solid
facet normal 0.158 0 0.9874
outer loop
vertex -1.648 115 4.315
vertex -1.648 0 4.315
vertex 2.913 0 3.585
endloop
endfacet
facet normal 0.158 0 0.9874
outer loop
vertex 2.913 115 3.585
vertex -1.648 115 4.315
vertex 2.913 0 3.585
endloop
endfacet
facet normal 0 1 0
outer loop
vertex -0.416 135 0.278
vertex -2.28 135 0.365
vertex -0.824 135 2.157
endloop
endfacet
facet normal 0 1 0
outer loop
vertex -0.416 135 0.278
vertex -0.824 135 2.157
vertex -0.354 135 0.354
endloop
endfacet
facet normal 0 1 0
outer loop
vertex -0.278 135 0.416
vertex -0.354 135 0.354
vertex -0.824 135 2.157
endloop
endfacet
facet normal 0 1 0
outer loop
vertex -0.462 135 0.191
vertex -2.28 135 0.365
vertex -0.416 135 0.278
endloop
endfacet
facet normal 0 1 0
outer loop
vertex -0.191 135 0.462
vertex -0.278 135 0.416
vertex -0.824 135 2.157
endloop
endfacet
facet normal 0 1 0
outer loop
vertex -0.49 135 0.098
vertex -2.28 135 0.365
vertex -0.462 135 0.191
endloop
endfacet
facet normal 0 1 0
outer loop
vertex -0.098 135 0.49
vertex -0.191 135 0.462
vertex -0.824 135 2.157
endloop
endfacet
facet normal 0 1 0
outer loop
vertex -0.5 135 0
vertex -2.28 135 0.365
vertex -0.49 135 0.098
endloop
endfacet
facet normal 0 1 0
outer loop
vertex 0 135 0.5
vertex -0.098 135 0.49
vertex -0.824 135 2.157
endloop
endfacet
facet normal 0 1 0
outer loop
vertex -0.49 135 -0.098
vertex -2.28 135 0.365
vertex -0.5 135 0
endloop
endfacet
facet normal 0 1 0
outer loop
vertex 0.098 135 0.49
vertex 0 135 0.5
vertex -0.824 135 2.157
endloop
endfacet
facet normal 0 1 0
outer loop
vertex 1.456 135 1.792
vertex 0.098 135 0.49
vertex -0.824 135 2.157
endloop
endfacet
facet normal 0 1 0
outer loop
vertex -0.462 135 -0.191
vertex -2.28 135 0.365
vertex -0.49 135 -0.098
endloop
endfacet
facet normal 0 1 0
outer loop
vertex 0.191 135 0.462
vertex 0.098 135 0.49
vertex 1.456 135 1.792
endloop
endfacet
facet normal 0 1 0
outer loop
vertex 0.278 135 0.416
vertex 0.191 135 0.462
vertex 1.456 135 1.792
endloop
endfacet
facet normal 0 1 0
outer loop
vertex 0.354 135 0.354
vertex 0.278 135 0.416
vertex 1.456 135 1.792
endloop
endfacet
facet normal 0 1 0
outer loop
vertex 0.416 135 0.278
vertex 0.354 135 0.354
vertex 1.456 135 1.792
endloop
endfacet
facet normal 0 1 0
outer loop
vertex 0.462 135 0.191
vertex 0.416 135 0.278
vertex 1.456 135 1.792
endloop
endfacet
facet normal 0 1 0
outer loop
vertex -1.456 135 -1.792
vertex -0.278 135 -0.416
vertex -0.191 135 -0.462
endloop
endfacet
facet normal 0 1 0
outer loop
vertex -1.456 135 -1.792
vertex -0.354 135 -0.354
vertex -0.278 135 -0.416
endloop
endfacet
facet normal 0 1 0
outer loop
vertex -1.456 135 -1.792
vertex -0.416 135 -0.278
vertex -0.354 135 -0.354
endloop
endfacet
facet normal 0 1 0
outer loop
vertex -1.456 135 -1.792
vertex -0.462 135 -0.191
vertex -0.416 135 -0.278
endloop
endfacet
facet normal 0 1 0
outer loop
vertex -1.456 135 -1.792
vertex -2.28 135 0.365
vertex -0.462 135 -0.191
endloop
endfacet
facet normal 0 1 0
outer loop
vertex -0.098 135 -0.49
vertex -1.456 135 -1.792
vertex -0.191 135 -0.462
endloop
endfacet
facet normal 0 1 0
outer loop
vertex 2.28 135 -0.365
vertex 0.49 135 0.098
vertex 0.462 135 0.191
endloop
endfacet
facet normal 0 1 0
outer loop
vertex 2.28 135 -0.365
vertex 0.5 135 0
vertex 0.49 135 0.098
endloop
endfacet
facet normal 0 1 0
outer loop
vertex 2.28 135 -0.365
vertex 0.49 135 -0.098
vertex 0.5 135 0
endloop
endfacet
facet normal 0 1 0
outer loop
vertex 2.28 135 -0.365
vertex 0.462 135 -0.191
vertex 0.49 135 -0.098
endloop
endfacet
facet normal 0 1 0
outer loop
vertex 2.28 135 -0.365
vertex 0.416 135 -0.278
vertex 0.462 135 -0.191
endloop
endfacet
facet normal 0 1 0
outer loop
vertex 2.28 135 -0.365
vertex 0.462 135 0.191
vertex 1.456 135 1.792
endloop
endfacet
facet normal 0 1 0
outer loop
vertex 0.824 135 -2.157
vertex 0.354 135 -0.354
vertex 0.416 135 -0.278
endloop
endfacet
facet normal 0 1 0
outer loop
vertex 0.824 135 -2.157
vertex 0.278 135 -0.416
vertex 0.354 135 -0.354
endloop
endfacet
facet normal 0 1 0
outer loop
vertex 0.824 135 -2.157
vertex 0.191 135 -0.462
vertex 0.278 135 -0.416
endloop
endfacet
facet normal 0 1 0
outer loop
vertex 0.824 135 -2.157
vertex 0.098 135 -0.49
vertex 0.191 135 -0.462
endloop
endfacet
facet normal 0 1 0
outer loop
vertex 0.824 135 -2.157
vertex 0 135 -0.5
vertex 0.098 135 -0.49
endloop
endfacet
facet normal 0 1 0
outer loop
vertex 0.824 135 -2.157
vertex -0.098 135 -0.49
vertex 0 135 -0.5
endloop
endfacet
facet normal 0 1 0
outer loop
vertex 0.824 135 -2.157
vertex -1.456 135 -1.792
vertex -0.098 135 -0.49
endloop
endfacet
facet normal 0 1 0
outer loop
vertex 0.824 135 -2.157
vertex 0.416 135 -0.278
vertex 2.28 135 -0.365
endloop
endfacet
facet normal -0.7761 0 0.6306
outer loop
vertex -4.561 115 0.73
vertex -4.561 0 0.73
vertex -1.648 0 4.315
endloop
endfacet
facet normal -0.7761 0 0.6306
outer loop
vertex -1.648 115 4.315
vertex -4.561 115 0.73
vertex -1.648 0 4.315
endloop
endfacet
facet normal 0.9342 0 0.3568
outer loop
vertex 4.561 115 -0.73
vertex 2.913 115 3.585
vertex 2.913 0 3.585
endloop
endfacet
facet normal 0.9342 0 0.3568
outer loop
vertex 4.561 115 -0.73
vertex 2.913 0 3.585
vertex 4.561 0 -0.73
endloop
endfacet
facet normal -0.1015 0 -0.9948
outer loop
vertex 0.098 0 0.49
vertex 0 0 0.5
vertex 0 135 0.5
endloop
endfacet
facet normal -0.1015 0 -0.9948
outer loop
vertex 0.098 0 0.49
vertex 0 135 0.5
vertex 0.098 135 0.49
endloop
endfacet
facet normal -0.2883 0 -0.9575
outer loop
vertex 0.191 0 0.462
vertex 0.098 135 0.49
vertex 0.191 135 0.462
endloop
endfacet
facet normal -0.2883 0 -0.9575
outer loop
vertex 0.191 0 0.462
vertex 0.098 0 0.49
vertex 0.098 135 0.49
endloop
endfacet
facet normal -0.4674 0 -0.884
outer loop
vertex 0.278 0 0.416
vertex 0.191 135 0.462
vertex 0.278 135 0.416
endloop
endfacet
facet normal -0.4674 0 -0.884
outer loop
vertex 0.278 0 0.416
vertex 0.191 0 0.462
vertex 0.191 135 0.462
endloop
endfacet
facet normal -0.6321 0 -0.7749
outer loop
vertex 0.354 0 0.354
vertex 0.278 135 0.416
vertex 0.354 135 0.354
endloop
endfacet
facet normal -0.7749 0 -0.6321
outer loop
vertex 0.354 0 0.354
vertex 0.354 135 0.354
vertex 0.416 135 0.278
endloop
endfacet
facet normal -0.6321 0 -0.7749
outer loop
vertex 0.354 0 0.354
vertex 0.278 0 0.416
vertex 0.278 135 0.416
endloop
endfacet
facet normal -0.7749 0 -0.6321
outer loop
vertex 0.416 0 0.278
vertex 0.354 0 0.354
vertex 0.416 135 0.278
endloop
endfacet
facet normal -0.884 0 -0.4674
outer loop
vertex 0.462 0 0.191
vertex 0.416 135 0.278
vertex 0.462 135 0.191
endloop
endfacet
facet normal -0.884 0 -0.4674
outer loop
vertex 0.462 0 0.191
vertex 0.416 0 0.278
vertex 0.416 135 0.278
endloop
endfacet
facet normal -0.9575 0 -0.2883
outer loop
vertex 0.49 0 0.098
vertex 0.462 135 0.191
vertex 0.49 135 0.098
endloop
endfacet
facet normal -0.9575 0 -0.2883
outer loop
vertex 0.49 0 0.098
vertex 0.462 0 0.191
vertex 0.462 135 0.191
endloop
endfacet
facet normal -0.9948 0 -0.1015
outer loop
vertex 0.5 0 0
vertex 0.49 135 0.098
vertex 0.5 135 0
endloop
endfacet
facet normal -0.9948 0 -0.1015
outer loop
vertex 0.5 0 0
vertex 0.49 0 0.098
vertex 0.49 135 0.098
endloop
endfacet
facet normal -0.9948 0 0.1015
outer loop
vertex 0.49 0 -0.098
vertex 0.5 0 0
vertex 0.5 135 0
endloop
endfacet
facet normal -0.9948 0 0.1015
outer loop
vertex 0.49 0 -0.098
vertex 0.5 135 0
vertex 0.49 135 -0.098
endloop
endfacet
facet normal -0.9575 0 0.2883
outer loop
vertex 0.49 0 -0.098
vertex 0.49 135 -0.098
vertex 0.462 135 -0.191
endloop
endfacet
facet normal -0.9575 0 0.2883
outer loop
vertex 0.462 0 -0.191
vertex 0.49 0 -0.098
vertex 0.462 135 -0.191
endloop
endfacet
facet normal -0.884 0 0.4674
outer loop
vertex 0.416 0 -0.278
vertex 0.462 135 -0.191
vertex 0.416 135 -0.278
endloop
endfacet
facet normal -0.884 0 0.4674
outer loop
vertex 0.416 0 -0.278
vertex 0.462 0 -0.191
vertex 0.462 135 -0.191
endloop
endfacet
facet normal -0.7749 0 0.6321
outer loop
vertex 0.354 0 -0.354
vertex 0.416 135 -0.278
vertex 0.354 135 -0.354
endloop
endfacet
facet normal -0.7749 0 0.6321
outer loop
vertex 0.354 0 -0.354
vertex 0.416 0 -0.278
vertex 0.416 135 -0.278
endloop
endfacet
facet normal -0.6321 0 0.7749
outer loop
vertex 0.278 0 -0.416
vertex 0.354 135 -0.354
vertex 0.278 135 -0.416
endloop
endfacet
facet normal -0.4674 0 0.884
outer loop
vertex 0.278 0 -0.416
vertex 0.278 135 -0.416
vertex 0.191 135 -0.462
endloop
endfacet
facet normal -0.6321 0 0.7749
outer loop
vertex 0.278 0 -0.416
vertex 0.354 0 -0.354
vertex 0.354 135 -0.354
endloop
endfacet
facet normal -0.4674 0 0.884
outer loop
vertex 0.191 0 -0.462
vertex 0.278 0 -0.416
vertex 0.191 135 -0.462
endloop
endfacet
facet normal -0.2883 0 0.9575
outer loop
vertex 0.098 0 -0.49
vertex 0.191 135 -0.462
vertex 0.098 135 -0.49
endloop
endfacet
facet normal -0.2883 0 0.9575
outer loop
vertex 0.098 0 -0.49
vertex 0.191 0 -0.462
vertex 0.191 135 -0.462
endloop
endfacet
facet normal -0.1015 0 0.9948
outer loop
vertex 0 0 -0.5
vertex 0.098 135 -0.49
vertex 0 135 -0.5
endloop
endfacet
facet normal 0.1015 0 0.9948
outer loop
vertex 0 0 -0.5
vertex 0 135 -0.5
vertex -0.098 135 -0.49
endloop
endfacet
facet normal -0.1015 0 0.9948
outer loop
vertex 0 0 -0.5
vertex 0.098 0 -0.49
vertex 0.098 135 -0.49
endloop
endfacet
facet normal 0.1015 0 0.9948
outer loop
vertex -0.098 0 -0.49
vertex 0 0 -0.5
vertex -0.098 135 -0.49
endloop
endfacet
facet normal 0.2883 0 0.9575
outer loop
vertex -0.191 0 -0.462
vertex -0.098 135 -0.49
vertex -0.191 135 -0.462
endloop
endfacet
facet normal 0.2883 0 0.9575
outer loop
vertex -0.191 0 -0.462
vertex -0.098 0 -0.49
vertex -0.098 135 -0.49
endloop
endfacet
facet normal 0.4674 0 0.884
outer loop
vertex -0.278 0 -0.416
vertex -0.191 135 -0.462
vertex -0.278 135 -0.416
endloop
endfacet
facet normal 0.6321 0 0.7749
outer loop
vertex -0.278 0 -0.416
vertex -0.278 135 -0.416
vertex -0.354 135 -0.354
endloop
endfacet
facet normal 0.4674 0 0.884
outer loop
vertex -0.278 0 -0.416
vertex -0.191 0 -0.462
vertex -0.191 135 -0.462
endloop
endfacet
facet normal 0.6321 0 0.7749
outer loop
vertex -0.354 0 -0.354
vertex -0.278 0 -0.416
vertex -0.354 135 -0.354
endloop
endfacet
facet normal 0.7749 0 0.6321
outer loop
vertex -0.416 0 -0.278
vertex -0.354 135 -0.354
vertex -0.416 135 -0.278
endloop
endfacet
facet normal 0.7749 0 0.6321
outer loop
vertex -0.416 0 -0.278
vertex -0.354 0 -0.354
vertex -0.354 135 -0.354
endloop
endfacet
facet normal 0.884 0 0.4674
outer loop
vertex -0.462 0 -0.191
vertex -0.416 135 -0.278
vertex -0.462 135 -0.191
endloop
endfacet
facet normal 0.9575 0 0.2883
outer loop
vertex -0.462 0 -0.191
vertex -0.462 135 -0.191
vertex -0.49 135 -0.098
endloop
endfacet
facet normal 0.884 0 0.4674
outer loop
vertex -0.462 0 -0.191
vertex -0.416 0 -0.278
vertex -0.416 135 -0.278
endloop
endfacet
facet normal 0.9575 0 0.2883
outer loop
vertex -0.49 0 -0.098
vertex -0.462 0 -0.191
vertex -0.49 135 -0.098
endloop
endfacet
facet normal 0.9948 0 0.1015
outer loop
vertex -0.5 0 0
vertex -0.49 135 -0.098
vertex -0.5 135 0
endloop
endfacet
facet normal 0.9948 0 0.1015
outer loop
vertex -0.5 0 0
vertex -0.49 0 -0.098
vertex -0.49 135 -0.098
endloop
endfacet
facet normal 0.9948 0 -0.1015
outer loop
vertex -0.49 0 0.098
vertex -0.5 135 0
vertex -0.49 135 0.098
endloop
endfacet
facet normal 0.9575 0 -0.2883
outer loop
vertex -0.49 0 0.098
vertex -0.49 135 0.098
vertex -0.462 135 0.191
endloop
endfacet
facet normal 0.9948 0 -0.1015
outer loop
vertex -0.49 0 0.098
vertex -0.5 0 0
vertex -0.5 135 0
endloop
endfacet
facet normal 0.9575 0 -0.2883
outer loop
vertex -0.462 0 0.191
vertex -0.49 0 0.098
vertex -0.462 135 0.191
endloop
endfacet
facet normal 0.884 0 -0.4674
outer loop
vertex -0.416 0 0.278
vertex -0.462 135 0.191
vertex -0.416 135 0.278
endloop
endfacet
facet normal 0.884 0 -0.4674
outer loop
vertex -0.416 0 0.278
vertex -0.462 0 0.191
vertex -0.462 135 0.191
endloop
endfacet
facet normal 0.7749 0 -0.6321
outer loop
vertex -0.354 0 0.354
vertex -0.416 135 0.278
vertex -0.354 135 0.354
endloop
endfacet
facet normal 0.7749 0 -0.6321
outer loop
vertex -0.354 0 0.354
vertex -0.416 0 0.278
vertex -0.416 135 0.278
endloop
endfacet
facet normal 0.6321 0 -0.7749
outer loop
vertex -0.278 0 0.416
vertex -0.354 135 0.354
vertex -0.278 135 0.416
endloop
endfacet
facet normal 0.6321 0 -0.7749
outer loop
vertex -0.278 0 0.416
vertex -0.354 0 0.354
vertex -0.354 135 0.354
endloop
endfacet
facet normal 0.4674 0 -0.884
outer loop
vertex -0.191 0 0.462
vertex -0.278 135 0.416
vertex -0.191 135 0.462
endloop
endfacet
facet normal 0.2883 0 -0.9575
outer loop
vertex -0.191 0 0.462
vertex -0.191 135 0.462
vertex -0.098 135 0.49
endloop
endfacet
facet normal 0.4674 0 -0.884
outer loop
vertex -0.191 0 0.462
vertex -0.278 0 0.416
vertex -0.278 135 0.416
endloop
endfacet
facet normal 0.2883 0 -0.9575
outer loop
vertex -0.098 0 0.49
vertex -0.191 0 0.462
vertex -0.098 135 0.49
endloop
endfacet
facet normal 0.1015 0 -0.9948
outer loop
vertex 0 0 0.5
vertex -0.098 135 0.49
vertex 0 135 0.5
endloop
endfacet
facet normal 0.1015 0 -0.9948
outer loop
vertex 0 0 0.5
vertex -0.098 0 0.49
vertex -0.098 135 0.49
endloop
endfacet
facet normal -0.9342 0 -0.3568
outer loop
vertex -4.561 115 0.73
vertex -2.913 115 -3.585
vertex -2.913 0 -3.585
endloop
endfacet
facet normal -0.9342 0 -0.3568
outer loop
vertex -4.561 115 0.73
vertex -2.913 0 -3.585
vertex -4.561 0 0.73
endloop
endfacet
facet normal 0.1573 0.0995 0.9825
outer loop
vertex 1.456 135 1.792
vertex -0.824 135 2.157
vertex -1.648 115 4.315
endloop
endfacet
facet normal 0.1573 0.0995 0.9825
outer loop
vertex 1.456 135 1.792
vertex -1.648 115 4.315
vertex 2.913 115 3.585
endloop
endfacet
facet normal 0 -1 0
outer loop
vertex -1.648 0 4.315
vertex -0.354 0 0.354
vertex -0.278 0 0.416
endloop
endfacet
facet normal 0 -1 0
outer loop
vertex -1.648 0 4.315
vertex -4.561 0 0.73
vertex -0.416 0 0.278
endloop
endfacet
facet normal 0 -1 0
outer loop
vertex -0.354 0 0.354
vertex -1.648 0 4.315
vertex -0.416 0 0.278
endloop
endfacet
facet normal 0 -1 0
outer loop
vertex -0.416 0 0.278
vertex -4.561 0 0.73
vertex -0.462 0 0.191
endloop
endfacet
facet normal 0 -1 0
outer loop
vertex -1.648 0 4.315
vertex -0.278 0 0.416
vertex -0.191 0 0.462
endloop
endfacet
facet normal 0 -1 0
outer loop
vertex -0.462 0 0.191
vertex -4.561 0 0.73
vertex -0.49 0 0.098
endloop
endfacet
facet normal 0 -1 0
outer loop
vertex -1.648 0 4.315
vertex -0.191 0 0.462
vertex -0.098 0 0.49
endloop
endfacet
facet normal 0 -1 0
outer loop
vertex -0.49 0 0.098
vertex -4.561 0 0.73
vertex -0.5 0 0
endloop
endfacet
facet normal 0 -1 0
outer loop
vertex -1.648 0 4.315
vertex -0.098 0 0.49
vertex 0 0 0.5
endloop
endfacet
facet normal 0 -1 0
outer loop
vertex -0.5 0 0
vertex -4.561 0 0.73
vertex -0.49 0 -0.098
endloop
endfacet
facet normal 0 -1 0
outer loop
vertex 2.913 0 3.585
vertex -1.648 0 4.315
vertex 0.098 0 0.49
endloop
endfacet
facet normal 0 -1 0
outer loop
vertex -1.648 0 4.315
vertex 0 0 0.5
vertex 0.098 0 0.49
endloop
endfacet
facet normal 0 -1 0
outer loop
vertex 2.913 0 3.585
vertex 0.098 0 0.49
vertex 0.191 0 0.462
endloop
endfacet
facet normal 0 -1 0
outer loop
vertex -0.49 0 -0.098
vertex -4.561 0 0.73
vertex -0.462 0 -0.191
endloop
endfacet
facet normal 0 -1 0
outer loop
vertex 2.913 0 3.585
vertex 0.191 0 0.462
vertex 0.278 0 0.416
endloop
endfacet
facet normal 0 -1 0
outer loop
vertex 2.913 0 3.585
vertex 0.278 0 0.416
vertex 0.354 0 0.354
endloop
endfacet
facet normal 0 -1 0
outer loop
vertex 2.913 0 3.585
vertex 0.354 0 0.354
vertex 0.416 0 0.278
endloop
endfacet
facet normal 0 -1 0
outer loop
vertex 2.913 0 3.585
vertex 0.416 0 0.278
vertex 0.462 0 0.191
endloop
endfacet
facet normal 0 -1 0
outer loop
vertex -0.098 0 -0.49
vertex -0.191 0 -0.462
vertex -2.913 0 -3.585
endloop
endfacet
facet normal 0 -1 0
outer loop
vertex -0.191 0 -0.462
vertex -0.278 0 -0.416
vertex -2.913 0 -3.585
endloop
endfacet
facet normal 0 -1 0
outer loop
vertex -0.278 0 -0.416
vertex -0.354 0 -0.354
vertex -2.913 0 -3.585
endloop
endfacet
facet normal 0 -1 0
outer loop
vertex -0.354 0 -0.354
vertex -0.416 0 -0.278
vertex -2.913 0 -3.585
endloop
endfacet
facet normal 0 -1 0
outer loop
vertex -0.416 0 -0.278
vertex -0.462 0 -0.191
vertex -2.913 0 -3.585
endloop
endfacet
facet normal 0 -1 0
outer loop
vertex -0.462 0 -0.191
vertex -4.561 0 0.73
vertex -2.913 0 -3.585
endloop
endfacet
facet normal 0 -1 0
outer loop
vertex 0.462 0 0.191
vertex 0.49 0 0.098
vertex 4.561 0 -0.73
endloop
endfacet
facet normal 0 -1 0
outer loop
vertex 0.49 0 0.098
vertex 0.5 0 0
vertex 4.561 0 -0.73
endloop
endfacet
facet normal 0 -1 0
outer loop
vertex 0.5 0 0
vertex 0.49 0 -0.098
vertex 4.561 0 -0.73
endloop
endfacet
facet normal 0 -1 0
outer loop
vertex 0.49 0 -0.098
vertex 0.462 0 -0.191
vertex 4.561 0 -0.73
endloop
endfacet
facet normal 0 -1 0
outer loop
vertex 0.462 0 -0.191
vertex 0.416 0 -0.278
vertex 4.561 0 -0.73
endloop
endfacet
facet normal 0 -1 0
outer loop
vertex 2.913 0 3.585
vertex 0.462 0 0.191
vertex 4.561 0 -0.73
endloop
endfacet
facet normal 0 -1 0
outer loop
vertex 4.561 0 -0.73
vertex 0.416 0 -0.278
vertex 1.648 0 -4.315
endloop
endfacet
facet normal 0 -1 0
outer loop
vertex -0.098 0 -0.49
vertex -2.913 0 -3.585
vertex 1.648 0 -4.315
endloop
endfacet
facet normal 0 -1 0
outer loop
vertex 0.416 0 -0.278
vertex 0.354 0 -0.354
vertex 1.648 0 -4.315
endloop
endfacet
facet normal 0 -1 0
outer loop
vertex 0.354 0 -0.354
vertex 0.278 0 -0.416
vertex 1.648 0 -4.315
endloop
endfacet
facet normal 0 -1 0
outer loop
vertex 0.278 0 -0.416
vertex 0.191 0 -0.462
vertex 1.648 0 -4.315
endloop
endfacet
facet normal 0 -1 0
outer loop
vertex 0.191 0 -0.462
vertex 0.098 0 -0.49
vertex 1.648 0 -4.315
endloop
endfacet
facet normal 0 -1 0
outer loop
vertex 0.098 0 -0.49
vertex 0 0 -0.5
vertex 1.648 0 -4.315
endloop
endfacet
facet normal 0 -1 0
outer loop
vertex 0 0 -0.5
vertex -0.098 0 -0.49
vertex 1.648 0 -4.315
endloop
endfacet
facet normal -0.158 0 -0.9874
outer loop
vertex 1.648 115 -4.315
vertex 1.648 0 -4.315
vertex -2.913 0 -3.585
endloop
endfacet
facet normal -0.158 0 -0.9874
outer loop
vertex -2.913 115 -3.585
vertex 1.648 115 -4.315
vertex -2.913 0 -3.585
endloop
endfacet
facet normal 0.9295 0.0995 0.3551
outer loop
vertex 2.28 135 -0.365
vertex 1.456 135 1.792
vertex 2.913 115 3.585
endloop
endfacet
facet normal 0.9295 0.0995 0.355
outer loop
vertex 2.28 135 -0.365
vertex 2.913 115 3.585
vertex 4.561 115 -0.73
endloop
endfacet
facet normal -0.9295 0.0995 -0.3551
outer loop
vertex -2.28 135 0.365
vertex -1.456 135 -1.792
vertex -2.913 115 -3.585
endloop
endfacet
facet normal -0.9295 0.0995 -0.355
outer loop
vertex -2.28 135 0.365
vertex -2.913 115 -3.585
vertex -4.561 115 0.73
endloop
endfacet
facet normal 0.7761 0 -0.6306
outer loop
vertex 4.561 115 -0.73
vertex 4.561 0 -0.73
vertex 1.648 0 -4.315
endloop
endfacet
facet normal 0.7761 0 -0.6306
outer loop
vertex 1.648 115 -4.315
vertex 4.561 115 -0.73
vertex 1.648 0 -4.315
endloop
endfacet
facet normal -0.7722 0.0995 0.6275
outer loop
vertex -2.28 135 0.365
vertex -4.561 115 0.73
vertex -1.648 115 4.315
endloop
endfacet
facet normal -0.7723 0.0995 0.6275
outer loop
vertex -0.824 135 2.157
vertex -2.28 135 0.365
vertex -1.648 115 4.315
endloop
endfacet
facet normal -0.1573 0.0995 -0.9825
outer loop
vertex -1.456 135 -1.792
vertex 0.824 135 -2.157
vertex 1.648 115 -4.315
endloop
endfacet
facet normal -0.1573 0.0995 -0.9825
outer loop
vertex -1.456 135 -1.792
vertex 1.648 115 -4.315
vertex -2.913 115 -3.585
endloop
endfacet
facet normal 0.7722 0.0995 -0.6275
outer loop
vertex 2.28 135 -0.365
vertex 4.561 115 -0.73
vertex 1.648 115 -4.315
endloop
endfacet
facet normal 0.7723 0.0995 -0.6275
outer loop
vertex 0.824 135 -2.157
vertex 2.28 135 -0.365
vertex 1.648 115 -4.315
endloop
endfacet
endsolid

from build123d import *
from OCP.BRepFilletAPI import BRepFilletAPI_MakeChamfer

# Parameters (mm, degrees)
SKIZZE1_R                       = 0.5
AUFSATZ_LINEAR_AUSTRAGEN1_DEPTH = 135
FASE2_SIZE                      = 20
FASE2_SIZE2                     = 2


with BuildPart() as part:
    # Skizze1 → Aufsatz-Linear austragen1 (new body)
    with BuildSketch(Plane(origin=(0, 0, 0), x_dir=(1, 0, 0), z_dir=(0, 1, 0))):
        Polygon((2.912582575, -3.584717015), (4.560747288, 0.730011993), (1.648164713, 4.314729008), (-2.912582575, 3.584717015), (-4.560747288, -0.730011993), (-1.648164713, -4.314729008), align=None)
        with Locations(Location((0, 0, 0), (0, 0, 270))):
            Circle(SKIZZE1_R, mode=Mode.SUBTRACT)
    extrude(amount=AUFSATZ_LINEAR_AUSTRAGEN1_DEPTH)

    # Fase2: one chamfer whose edges measure the first distance from different faces: ONE call of the kernel's chamfer builder (chamfer() names one face for all edges)
    fase2_edges_1 = [part.edges().sort_by_distance(p)[0] for p in [
        (3.104456, 135, -2.5223705),
    ]]
    fase2_side_1 = [part.faces().sort_by_distance(p)[0] for p in [
        (3.104456, 67.5, -2.5223705),
    ]]
    fase2_edges_2 = [part.edges().sort_by_distance(p)[0] for p in [
        (-0.632208931, 135, -3.949723012),
    ]]
    fase2_side_2 = [part.faces().sort_by_distance(p)[0] for p in [
        (-0.632208931, 67.5, -3.949723012),
    ]]
    fase2_edges_3 = [part.edges().sort_by_distance(p)[0] for p in [
        (-3.736664931, 135, -1.427352511),
    ]]
    fase2_side_3 = [part.faces().sort_by_distance(p)[0] for p in [
        (-3.736664931, 67.5, -1.427352511),
    ]]
    fase2_edges_4 = [part.edges().sort_by_distance(p)[0] for p in [
        (-3.104456, 135, 2.5223705),
    ]]
    fase2_side_4 = [part.faces().sort_by_distance(p)[0] for p in [
        (-3.104456, 67.5, 2.5223705),
    ]]
    fase2_edges_5 = [part.edges().sort_by_distance(p)[0] for p in [
        (0.632208931, 135, 3.949723012),
    ]]
    fase2_side_5 = [part.faces().sort_by_distance(p)[0] for p in [
        (0.632208931, 67.5, 3.949723012),
    ]]
    fase2_edges_6 = [part.edges().sort_by_distance(p)[0] for p in [
        (3.736664931, 135, 1.427352511),
    ]]
    fase2_side_6 = [part.faces().sort_by_distance(p)[0] for p in [
        (3.736664931, 67.5, 1.427352511),
    ]]
    fase2 = BRepFilletAPI_MakeChamfer(part.part.solid().wrapped)
    for e in fase2_edges_1:
        fase2.Add(FASE2_SIZE, FASE2_SIZE2, e.wrapped, fase2_side_1[0].wrapped)  # the first distance lies on this face
    for e in fase2_edges_2:
        fase2.Add(FASE2_SIZE, FASE2_SIZE2, e.wrapped, fase2_side_2[0].wrapped)  # the first distance lies on this face
    for e in fase2_edges_3:
        fase2.Add(FASE2_SIZE, FASE2_SIZE2, e.wrapped, fase2_side_3[0].wrapped)  # the first distance lies on this face
    for e in fase2_edges_4:
        fase2.Add(FASE2_SIZE, FASE2_SIZE2, e.wrapped, fase2_side_4[0].wrapped)  # the first distance lies on this face
    for e in fase2_edges_5:
        fase2.Add(FASE2_SIZE, FASE2_SIZE2, e.wrapped, fase2_side_5[0].wrapped)  # the first distance lies on this face
    for e in fase2_edges_6:
        fase2.Add(FASE2_SIZE, FASE2_SIZE2, e.wrapped, fase2_side_6[0].wrapped)  # the first distance lies on this face
    add(Compound.cast(fase2.Shape()), mode=Mode.REPLACE)


solid = part.part
